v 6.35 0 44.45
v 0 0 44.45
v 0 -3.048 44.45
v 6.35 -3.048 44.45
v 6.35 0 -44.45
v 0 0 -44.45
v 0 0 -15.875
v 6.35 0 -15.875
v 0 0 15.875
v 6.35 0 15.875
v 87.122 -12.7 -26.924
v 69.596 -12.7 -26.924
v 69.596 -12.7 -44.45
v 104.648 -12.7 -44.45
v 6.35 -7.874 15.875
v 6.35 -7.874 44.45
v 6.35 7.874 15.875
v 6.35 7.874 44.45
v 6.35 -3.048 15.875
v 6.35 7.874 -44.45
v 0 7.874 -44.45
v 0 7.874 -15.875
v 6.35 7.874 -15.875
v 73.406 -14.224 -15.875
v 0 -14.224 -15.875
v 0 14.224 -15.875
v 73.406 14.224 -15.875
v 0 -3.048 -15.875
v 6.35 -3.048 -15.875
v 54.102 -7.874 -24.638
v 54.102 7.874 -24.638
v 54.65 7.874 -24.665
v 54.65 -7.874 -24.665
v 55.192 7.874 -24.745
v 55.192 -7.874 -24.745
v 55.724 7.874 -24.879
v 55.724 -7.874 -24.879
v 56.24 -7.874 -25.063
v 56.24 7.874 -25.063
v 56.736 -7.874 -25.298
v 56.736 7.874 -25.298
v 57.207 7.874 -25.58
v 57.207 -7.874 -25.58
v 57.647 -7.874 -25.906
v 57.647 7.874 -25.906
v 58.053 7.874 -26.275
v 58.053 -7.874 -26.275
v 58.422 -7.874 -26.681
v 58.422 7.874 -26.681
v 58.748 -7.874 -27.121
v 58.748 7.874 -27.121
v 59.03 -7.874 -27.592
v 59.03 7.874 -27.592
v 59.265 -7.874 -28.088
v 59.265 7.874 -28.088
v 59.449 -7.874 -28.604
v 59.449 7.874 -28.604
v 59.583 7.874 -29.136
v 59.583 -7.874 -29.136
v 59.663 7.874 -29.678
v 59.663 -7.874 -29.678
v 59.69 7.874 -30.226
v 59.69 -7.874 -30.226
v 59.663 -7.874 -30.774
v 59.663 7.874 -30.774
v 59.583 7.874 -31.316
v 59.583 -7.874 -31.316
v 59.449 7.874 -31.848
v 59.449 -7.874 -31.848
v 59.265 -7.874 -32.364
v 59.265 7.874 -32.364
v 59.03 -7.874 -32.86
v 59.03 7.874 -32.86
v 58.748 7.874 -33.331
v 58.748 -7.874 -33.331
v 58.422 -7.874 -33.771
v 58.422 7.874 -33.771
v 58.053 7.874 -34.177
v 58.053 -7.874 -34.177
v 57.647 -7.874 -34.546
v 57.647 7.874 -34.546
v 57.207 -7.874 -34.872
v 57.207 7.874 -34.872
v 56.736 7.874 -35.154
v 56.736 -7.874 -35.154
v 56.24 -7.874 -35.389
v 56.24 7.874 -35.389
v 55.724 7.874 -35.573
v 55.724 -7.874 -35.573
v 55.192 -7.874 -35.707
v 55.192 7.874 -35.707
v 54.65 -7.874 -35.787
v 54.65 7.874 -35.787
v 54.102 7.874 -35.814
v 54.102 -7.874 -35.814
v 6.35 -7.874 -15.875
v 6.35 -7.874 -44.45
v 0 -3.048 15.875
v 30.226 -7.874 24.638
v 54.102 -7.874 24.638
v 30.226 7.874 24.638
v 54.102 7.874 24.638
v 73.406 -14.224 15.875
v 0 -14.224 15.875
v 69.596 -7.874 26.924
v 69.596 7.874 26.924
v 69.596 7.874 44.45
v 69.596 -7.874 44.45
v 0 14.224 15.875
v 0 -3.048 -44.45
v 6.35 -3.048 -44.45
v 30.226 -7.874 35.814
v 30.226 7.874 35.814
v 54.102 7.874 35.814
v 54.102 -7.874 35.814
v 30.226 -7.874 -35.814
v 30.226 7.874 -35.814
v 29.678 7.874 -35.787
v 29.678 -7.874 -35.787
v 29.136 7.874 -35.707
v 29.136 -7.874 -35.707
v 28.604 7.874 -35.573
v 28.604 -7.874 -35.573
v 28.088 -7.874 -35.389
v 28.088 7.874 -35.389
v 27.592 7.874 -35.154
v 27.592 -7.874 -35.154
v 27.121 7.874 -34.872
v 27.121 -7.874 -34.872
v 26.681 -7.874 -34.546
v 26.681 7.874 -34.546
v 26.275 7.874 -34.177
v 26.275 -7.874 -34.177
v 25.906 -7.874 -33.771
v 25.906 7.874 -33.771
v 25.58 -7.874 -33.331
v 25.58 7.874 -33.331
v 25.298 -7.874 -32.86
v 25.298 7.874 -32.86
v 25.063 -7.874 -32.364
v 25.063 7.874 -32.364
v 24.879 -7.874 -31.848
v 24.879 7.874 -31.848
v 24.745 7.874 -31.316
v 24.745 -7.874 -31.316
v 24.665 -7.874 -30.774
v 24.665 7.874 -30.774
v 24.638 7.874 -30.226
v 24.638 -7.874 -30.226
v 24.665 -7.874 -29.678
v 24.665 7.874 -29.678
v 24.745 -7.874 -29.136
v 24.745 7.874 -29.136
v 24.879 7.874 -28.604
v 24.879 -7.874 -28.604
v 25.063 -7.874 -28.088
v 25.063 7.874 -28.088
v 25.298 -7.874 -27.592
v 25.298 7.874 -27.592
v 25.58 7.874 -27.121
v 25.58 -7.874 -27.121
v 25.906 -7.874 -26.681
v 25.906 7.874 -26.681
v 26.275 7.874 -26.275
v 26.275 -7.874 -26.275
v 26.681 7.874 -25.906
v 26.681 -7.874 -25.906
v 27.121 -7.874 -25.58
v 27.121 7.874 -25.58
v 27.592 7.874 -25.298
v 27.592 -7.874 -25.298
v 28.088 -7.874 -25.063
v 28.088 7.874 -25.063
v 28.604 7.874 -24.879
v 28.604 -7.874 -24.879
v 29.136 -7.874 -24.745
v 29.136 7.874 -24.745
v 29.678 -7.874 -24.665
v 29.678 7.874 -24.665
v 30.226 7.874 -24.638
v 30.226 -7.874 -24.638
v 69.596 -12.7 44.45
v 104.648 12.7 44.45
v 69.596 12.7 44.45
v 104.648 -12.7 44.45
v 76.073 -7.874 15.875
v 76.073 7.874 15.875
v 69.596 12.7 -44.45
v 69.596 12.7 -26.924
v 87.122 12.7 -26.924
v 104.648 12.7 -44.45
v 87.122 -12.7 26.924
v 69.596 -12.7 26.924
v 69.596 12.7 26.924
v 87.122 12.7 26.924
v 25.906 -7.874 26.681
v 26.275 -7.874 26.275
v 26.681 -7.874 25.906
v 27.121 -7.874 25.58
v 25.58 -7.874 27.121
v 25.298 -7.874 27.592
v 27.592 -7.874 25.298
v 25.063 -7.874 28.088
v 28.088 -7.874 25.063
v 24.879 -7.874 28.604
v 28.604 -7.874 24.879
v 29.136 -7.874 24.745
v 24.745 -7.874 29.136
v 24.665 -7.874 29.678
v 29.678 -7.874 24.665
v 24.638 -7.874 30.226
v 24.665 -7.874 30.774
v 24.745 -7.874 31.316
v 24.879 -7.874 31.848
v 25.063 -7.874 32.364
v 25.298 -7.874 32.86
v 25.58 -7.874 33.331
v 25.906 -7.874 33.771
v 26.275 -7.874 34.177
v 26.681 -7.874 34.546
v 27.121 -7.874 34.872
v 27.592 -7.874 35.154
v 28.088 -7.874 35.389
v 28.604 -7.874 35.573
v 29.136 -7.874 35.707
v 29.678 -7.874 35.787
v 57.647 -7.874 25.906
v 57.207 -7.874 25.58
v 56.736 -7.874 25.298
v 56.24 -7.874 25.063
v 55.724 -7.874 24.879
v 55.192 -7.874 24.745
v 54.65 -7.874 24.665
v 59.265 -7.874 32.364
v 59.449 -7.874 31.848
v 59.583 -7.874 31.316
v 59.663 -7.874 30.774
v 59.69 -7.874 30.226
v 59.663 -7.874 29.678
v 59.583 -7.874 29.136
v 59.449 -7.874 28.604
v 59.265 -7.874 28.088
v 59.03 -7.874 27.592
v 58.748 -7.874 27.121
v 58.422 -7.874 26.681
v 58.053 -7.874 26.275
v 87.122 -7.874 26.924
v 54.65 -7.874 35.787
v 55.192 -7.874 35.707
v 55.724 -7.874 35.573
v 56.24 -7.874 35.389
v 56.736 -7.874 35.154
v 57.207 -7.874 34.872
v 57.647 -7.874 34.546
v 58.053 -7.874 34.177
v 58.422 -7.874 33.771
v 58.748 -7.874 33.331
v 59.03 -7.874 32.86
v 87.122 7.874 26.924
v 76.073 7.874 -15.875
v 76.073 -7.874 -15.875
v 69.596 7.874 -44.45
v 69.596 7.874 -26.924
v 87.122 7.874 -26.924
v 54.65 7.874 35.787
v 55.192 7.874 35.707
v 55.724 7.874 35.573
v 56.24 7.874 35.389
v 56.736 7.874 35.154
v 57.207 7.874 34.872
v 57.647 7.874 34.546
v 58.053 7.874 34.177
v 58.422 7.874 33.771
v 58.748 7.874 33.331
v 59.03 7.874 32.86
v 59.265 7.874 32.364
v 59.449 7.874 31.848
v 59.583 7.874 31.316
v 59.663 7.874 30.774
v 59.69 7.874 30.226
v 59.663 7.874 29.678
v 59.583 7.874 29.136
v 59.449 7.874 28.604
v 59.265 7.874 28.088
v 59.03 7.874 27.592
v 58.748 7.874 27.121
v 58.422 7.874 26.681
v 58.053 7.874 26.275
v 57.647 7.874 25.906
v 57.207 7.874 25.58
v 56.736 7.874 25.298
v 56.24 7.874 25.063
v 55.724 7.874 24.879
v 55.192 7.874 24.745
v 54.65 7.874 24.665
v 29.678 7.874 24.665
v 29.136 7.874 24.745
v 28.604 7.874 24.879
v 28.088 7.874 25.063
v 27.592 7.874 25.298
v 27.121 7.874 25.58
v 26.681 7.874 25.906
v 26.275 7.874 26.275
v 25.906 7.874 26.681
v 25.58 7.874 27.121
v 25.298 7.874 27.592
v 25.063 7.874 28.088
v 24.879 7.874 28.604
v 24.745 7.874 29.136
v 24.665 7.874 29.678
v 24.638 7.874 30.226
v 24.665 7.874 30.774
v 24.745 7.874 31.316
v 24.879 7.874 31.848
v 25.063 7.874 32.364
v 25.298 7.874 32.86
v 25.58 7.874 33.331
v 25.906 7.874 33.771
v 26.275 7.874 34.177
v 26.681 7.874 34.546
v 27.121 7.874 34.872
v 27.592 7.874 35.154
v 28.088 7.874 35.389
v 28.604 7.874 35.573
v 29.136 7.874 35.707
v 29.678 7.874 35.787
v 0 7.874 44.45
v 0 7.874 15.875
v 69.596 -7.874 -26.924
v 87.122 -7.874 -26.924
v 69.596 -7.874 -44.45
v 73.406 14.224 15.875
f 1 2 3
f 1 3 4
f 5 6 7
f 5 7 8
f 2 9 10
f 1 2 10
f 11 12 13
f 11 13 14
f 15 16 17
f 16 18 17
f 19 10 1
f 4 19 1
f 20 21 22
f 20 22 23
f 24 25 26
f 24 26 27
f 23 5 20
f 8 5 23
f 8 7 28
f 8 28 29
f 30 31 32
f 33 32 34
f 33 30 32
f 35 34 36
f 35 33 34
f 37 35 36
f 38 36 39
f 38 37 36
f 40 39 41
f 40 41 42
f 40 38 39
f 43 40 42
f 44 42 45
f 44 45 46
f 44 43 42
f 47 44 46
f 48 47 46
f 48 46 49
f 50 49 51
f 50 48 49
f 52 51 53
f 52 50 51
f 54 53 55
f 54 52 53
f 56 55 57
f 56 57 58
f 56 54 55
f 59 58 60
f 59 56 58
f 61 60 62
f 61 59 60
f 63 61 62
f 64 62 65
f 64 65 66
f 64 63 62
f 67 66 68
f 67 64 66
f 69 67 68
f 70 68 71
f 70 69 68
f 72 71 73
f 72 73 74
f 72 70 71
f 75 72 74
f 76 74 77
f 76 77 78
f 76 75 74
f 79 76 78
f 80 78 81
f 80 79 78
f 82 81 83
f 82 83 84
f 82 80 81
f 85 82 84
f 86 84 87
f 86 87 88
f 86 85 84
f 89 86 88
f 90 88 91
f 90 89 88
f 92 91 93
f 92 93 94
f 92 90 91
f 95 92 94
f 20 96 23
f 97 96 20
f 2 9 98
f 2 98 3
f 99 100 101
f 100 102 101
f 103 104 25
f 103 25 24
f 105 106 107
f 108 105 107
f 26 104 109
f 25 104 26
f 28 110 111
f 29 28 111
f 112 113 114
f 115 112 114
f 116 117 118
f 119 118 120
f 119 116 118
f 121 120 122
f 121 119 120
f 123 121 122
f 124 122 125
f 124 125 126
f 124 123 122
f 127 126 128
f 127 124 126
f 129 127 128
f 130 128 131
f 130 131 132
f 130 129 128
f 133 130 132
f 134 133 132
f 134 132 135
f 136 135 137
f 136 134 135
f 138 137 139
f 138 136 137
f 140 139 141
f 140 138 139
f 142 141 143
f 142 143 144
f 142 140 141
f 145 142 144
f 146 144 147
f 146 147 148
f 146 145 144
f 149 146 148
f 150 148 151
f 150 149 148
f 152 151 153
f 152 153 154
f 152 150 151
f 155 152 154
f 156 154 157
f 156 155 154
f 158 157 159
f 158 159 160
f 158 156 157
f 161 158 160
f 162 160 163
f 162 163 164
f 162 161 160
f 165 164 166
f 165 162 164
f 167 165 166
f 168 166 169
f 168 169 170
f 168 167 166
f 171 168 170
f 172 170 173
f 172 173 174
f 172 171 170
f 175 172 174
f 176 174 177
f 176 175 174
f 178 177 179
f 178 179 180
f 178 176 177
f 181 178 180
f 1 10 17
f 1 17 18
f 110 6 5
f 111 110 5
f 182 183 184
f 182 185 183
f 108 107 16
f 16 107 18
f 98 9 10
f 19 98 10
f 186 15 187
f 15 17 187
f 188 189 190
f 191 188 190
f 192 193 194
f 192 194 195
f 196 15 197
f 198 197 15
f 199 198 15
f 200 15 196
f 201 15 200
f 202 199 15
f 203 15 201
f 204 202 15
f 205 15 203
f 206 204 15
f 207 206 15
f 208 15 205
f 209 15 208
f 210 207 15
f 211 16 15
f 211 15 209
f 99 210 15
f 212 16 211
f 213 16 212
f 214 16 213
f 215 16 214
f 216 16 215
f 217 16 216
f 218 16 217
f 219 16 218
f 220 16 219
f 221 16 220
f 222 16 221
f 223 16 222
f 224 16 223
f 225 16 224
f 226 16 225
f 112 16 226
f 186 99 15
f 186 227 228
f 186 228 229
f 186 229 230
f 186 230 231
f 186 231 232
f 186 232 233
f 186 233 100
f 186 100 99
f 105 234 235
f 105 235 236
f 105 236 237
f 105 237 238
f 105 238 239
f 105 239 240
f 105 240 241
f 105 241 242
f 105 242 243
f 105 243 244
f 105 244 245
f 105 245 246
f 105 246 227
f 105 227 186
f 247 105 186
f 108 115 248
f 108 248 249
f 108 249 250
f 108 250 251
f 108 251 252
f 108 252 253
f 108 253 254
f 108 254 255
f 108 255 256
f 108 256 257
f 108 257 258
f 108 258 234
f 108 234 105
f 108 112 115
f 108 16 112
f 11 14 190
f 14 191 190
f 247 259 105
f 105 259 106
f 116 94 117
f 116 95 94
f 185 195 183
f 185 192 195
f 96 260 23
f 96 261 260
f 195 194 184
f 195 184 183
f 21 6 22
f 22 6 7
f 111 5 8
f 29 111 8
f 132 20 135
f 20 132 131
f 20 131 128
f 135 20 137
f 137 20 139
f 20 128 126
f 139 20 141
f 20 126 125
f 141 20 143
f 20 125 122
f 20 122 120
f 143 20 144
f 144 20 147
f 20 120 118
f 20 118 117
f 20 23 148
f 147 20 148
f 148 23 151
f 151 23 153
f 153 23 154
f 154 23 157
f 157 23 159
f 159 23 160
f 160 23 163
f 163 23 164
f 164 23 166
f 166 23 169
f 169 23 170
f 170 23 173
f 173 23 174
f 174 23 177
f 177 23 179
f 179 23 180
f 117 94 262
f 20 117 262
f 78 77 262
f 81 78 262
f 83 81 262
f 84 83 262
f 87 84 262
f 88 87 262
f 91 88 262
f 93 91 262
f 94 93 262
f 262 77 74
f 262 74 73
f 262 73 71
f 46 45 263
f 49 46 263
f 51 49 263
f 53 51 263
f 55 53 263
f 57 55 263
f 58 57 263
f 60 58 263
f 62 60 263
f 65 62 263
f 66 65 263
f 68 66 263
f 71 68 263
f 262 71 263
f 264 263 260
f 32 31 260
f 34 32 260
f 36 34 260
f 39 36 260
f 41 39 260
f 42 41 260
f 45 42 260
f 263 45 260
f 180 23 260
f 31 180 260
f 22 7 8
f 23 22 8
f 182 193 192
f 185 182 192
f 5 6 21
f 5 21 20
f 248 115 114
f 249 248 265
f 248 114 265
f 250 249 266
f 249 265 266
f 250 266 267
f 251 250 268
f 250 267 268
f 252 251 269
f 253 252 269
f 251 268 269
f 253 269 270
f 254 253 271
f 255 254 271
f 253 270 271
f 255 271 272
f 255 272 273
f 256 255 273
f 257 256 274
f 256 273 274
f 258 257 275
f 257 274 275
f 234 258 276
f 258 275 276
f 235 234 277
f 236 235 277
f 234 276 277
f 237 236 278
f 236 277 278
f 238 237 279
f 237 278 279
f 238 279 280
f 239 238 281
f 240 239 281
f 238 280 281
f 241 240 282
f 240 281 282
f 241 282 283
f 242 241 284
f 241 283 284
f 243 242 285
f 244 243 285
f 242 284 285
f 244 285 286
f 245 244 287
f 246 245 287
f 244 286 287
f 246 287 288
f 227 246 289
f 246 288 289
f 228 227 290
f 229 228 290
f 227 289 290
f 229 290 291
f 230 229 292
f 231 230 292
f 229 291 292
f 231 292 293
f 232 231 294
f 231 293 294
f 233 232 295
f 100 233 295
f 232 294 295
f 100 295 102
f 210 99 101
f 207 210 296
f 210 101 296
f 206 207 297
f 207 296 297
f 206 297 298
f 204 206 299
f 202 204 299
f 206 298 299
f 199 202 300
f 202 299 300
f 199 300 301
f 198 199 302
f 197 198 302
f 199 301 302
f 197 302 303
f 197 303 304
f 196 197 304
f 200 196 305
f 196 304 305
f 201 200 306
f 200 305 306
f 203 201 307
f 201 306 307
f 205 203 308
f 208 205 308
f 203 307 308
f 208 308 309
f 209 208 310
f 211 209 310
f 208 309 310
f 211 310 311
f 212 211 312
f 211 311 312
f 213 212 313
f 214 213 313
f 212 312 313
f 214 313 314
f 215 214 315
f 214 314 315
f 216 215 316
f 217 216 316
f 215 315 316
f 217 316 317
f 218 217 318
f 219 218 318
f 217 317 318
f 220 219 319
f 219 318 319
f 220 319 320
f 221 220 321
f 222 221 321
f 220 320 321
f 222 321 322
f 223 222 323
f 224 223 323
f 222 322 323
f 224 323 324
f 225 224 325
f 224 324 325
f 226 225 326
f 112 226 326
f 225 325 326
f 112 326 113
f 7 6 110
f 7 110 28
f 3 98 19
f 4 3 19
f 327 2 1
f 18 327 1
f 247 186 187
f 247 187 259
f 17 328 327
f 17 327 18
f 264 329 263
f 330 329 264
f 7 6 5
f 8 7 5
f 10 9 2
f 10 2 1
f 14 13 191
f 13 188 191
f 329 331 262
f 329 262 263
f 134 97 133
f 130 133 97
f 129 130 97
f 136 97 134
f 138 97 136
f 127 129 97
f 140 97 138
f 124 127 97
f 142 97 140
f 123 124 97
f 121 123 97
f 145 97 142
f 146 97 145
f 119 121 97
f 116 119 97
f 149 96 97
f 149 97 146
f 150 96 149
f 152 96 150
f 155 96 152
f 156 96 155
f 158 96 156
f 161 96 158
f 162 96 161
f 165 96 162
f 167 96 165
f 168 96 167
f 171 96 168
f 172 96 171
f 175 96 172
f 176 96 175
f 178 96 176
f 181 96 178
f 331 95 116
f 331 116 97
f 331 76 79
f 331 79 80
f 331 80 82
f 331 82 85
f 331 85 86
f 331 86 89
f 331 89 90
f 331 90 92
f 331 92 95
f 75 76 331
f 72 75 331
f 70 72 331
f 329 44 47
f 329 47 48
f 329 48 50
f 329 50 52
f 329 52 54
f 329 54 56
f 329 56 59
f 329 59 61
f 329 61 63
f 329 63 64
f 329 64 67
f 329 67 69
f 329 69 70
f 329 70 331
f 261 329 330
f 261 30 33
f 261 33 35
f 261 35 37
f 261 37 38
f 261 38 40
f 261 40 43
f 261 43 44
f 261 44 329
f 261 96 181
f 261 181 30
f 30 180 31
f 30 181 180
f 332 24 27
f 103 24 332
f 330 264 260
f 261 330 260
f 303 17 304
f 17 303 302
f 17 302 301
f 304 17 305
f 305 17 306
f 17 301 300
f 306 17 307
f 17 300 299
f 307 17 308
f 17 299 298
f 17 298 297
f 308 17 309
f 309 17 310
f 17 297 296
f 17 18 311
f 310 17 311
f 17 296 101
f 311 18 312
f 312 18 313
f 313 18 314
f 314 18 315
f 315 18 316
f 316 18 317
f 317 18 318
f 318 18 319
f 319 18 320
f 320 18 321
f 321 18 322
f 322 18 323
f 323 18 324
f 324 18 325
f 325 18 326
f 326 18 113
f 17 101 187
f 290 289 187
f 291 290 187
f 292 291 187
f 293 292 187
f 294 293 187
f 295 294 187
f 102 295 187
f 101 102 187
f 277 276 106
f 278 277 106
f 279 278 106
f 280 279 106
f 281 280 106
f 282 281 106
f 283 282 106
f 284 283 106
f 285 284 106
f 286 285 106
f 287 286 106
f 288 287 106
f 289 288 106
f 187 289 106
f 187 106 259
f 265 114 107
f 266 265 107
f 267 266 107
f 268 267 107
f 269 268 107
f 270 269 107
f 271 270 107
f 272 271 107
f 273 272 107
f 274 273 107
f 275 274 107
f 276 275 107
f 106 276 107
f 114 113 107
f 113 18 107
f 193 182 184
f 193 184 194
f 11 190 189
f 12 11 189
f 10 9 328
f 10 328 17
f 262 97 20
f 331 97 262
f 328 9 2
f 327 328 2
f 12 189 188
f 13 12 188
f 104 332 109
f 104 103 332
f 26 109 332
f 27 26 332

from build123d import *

# Parameters (mm, degrees)
F1_DEPTH = 14.224
F2_DEPTH = 12.7
F3_DEPTH = 7.874
F0_W     = 6.35
F0_H     = 28.575
F4_DEPTH = 3.048
F5_DEPTH = 7.874


with BuildPart() as f1:
    # F0 (on Front) → F1 (new body, symmetric)
    with BuildSketch(Plane.XZ):
        Polygon((6.35, 15.875), (0, 15.875), (0, 0), (0, -15.875), (6.35, -15.875), (73.406, -15.875), (73.406, 0), (73.406, 15.875), align=None)
    extrude(amount=F1_DEPTH, both=True)


with BuildPart() as f2:
    # F0 (on Front) → F2 (new body, symmetric)
    with BuildSketch(Plane.XZ):
        Polygon((69.596, -26.924), (69.596, -44.45), (104.648, -44.45), (87.122, -26.924), align=None)
        Polygon((104.648, 44.45), (69.596, 44.45), (69.596, 26.924), (87.122, 26.924), align=None)
    extrude(amount=F2_DEPTH, both=True)


with BuildPart() as f3:
    # F0 (on Front) → F3 (new body, symmetric)
    with BuildSketch(Plane.XZ):
        Polygon((69.596, 44.45), (6.35, 44.45), (6.35, 15.875), (73.406, 15.875), (76.073, 15.875), (87.122, 26.924), (69.596, 26.924), align=None)
        with BuildLine():
            Line((54.102, 24.638), (30.226, 24.638))
            ThreePointArc((30.226, 24.638), (24.638, 30.226), (30.226, 35.814))
            Line((30.226, 35.814), (54.102, 35.814))
            ThreePointArc((54.102, 35.814), (59.69, 30.226), (54.102, 24.638))
        make_face(mode=Mode.SUBTRACT)
        Polygon((73.406, -15.875), (6.35, -15.875), (6.35, -44.45), (69.596, -44.45), (69.596, -26.924), (87.122, -26.924), (76.073, -15.875), align=None)
        with BuildLine():
            ThreePointArc((30.226, -35.814), (24.638, -30.226), (30.226, -24.638))
            Line((30.226, -24.638), (54.102, -24.638))
            ThreePointArc((54.102, -24.638), (59.69, -30.226), (54.102, -35.814))
            Line((54.102, -35.814), (30.226, -35.814))
        make_face(mode=Mode.SUBTRACT)
    extrude(amount=F3_DEPTH, both=True)


with BuildPart() as f4:
    # F0 (on Front) → F4 (new body)
    with BuildSketch(Plane.XZ):
        with Locations((3.175, 30.1625)):
            Rectangle(F0_W, F0_H)
        with Locations((3.175, -30.1625)):
            Rectangle(F0_W, F0_H)
    extrude(amount=F4_DEPTH)


with BuildPart() as f5:
    # F0 (on Front) → F5 (new body)
    with BuildSketch(Plane.XZ):
        with Locations((3.175, -30.1625)):
            Rectangle(F0_W, F0_H)
        with Locations((3.175, 30.1625)):
            Rectangle(F0_W, F0_H)
    extrude(amount=-F5_DEPTH)


solid = Compound([f1.part, f2.part, f3.part, f4.part, f5.part])
